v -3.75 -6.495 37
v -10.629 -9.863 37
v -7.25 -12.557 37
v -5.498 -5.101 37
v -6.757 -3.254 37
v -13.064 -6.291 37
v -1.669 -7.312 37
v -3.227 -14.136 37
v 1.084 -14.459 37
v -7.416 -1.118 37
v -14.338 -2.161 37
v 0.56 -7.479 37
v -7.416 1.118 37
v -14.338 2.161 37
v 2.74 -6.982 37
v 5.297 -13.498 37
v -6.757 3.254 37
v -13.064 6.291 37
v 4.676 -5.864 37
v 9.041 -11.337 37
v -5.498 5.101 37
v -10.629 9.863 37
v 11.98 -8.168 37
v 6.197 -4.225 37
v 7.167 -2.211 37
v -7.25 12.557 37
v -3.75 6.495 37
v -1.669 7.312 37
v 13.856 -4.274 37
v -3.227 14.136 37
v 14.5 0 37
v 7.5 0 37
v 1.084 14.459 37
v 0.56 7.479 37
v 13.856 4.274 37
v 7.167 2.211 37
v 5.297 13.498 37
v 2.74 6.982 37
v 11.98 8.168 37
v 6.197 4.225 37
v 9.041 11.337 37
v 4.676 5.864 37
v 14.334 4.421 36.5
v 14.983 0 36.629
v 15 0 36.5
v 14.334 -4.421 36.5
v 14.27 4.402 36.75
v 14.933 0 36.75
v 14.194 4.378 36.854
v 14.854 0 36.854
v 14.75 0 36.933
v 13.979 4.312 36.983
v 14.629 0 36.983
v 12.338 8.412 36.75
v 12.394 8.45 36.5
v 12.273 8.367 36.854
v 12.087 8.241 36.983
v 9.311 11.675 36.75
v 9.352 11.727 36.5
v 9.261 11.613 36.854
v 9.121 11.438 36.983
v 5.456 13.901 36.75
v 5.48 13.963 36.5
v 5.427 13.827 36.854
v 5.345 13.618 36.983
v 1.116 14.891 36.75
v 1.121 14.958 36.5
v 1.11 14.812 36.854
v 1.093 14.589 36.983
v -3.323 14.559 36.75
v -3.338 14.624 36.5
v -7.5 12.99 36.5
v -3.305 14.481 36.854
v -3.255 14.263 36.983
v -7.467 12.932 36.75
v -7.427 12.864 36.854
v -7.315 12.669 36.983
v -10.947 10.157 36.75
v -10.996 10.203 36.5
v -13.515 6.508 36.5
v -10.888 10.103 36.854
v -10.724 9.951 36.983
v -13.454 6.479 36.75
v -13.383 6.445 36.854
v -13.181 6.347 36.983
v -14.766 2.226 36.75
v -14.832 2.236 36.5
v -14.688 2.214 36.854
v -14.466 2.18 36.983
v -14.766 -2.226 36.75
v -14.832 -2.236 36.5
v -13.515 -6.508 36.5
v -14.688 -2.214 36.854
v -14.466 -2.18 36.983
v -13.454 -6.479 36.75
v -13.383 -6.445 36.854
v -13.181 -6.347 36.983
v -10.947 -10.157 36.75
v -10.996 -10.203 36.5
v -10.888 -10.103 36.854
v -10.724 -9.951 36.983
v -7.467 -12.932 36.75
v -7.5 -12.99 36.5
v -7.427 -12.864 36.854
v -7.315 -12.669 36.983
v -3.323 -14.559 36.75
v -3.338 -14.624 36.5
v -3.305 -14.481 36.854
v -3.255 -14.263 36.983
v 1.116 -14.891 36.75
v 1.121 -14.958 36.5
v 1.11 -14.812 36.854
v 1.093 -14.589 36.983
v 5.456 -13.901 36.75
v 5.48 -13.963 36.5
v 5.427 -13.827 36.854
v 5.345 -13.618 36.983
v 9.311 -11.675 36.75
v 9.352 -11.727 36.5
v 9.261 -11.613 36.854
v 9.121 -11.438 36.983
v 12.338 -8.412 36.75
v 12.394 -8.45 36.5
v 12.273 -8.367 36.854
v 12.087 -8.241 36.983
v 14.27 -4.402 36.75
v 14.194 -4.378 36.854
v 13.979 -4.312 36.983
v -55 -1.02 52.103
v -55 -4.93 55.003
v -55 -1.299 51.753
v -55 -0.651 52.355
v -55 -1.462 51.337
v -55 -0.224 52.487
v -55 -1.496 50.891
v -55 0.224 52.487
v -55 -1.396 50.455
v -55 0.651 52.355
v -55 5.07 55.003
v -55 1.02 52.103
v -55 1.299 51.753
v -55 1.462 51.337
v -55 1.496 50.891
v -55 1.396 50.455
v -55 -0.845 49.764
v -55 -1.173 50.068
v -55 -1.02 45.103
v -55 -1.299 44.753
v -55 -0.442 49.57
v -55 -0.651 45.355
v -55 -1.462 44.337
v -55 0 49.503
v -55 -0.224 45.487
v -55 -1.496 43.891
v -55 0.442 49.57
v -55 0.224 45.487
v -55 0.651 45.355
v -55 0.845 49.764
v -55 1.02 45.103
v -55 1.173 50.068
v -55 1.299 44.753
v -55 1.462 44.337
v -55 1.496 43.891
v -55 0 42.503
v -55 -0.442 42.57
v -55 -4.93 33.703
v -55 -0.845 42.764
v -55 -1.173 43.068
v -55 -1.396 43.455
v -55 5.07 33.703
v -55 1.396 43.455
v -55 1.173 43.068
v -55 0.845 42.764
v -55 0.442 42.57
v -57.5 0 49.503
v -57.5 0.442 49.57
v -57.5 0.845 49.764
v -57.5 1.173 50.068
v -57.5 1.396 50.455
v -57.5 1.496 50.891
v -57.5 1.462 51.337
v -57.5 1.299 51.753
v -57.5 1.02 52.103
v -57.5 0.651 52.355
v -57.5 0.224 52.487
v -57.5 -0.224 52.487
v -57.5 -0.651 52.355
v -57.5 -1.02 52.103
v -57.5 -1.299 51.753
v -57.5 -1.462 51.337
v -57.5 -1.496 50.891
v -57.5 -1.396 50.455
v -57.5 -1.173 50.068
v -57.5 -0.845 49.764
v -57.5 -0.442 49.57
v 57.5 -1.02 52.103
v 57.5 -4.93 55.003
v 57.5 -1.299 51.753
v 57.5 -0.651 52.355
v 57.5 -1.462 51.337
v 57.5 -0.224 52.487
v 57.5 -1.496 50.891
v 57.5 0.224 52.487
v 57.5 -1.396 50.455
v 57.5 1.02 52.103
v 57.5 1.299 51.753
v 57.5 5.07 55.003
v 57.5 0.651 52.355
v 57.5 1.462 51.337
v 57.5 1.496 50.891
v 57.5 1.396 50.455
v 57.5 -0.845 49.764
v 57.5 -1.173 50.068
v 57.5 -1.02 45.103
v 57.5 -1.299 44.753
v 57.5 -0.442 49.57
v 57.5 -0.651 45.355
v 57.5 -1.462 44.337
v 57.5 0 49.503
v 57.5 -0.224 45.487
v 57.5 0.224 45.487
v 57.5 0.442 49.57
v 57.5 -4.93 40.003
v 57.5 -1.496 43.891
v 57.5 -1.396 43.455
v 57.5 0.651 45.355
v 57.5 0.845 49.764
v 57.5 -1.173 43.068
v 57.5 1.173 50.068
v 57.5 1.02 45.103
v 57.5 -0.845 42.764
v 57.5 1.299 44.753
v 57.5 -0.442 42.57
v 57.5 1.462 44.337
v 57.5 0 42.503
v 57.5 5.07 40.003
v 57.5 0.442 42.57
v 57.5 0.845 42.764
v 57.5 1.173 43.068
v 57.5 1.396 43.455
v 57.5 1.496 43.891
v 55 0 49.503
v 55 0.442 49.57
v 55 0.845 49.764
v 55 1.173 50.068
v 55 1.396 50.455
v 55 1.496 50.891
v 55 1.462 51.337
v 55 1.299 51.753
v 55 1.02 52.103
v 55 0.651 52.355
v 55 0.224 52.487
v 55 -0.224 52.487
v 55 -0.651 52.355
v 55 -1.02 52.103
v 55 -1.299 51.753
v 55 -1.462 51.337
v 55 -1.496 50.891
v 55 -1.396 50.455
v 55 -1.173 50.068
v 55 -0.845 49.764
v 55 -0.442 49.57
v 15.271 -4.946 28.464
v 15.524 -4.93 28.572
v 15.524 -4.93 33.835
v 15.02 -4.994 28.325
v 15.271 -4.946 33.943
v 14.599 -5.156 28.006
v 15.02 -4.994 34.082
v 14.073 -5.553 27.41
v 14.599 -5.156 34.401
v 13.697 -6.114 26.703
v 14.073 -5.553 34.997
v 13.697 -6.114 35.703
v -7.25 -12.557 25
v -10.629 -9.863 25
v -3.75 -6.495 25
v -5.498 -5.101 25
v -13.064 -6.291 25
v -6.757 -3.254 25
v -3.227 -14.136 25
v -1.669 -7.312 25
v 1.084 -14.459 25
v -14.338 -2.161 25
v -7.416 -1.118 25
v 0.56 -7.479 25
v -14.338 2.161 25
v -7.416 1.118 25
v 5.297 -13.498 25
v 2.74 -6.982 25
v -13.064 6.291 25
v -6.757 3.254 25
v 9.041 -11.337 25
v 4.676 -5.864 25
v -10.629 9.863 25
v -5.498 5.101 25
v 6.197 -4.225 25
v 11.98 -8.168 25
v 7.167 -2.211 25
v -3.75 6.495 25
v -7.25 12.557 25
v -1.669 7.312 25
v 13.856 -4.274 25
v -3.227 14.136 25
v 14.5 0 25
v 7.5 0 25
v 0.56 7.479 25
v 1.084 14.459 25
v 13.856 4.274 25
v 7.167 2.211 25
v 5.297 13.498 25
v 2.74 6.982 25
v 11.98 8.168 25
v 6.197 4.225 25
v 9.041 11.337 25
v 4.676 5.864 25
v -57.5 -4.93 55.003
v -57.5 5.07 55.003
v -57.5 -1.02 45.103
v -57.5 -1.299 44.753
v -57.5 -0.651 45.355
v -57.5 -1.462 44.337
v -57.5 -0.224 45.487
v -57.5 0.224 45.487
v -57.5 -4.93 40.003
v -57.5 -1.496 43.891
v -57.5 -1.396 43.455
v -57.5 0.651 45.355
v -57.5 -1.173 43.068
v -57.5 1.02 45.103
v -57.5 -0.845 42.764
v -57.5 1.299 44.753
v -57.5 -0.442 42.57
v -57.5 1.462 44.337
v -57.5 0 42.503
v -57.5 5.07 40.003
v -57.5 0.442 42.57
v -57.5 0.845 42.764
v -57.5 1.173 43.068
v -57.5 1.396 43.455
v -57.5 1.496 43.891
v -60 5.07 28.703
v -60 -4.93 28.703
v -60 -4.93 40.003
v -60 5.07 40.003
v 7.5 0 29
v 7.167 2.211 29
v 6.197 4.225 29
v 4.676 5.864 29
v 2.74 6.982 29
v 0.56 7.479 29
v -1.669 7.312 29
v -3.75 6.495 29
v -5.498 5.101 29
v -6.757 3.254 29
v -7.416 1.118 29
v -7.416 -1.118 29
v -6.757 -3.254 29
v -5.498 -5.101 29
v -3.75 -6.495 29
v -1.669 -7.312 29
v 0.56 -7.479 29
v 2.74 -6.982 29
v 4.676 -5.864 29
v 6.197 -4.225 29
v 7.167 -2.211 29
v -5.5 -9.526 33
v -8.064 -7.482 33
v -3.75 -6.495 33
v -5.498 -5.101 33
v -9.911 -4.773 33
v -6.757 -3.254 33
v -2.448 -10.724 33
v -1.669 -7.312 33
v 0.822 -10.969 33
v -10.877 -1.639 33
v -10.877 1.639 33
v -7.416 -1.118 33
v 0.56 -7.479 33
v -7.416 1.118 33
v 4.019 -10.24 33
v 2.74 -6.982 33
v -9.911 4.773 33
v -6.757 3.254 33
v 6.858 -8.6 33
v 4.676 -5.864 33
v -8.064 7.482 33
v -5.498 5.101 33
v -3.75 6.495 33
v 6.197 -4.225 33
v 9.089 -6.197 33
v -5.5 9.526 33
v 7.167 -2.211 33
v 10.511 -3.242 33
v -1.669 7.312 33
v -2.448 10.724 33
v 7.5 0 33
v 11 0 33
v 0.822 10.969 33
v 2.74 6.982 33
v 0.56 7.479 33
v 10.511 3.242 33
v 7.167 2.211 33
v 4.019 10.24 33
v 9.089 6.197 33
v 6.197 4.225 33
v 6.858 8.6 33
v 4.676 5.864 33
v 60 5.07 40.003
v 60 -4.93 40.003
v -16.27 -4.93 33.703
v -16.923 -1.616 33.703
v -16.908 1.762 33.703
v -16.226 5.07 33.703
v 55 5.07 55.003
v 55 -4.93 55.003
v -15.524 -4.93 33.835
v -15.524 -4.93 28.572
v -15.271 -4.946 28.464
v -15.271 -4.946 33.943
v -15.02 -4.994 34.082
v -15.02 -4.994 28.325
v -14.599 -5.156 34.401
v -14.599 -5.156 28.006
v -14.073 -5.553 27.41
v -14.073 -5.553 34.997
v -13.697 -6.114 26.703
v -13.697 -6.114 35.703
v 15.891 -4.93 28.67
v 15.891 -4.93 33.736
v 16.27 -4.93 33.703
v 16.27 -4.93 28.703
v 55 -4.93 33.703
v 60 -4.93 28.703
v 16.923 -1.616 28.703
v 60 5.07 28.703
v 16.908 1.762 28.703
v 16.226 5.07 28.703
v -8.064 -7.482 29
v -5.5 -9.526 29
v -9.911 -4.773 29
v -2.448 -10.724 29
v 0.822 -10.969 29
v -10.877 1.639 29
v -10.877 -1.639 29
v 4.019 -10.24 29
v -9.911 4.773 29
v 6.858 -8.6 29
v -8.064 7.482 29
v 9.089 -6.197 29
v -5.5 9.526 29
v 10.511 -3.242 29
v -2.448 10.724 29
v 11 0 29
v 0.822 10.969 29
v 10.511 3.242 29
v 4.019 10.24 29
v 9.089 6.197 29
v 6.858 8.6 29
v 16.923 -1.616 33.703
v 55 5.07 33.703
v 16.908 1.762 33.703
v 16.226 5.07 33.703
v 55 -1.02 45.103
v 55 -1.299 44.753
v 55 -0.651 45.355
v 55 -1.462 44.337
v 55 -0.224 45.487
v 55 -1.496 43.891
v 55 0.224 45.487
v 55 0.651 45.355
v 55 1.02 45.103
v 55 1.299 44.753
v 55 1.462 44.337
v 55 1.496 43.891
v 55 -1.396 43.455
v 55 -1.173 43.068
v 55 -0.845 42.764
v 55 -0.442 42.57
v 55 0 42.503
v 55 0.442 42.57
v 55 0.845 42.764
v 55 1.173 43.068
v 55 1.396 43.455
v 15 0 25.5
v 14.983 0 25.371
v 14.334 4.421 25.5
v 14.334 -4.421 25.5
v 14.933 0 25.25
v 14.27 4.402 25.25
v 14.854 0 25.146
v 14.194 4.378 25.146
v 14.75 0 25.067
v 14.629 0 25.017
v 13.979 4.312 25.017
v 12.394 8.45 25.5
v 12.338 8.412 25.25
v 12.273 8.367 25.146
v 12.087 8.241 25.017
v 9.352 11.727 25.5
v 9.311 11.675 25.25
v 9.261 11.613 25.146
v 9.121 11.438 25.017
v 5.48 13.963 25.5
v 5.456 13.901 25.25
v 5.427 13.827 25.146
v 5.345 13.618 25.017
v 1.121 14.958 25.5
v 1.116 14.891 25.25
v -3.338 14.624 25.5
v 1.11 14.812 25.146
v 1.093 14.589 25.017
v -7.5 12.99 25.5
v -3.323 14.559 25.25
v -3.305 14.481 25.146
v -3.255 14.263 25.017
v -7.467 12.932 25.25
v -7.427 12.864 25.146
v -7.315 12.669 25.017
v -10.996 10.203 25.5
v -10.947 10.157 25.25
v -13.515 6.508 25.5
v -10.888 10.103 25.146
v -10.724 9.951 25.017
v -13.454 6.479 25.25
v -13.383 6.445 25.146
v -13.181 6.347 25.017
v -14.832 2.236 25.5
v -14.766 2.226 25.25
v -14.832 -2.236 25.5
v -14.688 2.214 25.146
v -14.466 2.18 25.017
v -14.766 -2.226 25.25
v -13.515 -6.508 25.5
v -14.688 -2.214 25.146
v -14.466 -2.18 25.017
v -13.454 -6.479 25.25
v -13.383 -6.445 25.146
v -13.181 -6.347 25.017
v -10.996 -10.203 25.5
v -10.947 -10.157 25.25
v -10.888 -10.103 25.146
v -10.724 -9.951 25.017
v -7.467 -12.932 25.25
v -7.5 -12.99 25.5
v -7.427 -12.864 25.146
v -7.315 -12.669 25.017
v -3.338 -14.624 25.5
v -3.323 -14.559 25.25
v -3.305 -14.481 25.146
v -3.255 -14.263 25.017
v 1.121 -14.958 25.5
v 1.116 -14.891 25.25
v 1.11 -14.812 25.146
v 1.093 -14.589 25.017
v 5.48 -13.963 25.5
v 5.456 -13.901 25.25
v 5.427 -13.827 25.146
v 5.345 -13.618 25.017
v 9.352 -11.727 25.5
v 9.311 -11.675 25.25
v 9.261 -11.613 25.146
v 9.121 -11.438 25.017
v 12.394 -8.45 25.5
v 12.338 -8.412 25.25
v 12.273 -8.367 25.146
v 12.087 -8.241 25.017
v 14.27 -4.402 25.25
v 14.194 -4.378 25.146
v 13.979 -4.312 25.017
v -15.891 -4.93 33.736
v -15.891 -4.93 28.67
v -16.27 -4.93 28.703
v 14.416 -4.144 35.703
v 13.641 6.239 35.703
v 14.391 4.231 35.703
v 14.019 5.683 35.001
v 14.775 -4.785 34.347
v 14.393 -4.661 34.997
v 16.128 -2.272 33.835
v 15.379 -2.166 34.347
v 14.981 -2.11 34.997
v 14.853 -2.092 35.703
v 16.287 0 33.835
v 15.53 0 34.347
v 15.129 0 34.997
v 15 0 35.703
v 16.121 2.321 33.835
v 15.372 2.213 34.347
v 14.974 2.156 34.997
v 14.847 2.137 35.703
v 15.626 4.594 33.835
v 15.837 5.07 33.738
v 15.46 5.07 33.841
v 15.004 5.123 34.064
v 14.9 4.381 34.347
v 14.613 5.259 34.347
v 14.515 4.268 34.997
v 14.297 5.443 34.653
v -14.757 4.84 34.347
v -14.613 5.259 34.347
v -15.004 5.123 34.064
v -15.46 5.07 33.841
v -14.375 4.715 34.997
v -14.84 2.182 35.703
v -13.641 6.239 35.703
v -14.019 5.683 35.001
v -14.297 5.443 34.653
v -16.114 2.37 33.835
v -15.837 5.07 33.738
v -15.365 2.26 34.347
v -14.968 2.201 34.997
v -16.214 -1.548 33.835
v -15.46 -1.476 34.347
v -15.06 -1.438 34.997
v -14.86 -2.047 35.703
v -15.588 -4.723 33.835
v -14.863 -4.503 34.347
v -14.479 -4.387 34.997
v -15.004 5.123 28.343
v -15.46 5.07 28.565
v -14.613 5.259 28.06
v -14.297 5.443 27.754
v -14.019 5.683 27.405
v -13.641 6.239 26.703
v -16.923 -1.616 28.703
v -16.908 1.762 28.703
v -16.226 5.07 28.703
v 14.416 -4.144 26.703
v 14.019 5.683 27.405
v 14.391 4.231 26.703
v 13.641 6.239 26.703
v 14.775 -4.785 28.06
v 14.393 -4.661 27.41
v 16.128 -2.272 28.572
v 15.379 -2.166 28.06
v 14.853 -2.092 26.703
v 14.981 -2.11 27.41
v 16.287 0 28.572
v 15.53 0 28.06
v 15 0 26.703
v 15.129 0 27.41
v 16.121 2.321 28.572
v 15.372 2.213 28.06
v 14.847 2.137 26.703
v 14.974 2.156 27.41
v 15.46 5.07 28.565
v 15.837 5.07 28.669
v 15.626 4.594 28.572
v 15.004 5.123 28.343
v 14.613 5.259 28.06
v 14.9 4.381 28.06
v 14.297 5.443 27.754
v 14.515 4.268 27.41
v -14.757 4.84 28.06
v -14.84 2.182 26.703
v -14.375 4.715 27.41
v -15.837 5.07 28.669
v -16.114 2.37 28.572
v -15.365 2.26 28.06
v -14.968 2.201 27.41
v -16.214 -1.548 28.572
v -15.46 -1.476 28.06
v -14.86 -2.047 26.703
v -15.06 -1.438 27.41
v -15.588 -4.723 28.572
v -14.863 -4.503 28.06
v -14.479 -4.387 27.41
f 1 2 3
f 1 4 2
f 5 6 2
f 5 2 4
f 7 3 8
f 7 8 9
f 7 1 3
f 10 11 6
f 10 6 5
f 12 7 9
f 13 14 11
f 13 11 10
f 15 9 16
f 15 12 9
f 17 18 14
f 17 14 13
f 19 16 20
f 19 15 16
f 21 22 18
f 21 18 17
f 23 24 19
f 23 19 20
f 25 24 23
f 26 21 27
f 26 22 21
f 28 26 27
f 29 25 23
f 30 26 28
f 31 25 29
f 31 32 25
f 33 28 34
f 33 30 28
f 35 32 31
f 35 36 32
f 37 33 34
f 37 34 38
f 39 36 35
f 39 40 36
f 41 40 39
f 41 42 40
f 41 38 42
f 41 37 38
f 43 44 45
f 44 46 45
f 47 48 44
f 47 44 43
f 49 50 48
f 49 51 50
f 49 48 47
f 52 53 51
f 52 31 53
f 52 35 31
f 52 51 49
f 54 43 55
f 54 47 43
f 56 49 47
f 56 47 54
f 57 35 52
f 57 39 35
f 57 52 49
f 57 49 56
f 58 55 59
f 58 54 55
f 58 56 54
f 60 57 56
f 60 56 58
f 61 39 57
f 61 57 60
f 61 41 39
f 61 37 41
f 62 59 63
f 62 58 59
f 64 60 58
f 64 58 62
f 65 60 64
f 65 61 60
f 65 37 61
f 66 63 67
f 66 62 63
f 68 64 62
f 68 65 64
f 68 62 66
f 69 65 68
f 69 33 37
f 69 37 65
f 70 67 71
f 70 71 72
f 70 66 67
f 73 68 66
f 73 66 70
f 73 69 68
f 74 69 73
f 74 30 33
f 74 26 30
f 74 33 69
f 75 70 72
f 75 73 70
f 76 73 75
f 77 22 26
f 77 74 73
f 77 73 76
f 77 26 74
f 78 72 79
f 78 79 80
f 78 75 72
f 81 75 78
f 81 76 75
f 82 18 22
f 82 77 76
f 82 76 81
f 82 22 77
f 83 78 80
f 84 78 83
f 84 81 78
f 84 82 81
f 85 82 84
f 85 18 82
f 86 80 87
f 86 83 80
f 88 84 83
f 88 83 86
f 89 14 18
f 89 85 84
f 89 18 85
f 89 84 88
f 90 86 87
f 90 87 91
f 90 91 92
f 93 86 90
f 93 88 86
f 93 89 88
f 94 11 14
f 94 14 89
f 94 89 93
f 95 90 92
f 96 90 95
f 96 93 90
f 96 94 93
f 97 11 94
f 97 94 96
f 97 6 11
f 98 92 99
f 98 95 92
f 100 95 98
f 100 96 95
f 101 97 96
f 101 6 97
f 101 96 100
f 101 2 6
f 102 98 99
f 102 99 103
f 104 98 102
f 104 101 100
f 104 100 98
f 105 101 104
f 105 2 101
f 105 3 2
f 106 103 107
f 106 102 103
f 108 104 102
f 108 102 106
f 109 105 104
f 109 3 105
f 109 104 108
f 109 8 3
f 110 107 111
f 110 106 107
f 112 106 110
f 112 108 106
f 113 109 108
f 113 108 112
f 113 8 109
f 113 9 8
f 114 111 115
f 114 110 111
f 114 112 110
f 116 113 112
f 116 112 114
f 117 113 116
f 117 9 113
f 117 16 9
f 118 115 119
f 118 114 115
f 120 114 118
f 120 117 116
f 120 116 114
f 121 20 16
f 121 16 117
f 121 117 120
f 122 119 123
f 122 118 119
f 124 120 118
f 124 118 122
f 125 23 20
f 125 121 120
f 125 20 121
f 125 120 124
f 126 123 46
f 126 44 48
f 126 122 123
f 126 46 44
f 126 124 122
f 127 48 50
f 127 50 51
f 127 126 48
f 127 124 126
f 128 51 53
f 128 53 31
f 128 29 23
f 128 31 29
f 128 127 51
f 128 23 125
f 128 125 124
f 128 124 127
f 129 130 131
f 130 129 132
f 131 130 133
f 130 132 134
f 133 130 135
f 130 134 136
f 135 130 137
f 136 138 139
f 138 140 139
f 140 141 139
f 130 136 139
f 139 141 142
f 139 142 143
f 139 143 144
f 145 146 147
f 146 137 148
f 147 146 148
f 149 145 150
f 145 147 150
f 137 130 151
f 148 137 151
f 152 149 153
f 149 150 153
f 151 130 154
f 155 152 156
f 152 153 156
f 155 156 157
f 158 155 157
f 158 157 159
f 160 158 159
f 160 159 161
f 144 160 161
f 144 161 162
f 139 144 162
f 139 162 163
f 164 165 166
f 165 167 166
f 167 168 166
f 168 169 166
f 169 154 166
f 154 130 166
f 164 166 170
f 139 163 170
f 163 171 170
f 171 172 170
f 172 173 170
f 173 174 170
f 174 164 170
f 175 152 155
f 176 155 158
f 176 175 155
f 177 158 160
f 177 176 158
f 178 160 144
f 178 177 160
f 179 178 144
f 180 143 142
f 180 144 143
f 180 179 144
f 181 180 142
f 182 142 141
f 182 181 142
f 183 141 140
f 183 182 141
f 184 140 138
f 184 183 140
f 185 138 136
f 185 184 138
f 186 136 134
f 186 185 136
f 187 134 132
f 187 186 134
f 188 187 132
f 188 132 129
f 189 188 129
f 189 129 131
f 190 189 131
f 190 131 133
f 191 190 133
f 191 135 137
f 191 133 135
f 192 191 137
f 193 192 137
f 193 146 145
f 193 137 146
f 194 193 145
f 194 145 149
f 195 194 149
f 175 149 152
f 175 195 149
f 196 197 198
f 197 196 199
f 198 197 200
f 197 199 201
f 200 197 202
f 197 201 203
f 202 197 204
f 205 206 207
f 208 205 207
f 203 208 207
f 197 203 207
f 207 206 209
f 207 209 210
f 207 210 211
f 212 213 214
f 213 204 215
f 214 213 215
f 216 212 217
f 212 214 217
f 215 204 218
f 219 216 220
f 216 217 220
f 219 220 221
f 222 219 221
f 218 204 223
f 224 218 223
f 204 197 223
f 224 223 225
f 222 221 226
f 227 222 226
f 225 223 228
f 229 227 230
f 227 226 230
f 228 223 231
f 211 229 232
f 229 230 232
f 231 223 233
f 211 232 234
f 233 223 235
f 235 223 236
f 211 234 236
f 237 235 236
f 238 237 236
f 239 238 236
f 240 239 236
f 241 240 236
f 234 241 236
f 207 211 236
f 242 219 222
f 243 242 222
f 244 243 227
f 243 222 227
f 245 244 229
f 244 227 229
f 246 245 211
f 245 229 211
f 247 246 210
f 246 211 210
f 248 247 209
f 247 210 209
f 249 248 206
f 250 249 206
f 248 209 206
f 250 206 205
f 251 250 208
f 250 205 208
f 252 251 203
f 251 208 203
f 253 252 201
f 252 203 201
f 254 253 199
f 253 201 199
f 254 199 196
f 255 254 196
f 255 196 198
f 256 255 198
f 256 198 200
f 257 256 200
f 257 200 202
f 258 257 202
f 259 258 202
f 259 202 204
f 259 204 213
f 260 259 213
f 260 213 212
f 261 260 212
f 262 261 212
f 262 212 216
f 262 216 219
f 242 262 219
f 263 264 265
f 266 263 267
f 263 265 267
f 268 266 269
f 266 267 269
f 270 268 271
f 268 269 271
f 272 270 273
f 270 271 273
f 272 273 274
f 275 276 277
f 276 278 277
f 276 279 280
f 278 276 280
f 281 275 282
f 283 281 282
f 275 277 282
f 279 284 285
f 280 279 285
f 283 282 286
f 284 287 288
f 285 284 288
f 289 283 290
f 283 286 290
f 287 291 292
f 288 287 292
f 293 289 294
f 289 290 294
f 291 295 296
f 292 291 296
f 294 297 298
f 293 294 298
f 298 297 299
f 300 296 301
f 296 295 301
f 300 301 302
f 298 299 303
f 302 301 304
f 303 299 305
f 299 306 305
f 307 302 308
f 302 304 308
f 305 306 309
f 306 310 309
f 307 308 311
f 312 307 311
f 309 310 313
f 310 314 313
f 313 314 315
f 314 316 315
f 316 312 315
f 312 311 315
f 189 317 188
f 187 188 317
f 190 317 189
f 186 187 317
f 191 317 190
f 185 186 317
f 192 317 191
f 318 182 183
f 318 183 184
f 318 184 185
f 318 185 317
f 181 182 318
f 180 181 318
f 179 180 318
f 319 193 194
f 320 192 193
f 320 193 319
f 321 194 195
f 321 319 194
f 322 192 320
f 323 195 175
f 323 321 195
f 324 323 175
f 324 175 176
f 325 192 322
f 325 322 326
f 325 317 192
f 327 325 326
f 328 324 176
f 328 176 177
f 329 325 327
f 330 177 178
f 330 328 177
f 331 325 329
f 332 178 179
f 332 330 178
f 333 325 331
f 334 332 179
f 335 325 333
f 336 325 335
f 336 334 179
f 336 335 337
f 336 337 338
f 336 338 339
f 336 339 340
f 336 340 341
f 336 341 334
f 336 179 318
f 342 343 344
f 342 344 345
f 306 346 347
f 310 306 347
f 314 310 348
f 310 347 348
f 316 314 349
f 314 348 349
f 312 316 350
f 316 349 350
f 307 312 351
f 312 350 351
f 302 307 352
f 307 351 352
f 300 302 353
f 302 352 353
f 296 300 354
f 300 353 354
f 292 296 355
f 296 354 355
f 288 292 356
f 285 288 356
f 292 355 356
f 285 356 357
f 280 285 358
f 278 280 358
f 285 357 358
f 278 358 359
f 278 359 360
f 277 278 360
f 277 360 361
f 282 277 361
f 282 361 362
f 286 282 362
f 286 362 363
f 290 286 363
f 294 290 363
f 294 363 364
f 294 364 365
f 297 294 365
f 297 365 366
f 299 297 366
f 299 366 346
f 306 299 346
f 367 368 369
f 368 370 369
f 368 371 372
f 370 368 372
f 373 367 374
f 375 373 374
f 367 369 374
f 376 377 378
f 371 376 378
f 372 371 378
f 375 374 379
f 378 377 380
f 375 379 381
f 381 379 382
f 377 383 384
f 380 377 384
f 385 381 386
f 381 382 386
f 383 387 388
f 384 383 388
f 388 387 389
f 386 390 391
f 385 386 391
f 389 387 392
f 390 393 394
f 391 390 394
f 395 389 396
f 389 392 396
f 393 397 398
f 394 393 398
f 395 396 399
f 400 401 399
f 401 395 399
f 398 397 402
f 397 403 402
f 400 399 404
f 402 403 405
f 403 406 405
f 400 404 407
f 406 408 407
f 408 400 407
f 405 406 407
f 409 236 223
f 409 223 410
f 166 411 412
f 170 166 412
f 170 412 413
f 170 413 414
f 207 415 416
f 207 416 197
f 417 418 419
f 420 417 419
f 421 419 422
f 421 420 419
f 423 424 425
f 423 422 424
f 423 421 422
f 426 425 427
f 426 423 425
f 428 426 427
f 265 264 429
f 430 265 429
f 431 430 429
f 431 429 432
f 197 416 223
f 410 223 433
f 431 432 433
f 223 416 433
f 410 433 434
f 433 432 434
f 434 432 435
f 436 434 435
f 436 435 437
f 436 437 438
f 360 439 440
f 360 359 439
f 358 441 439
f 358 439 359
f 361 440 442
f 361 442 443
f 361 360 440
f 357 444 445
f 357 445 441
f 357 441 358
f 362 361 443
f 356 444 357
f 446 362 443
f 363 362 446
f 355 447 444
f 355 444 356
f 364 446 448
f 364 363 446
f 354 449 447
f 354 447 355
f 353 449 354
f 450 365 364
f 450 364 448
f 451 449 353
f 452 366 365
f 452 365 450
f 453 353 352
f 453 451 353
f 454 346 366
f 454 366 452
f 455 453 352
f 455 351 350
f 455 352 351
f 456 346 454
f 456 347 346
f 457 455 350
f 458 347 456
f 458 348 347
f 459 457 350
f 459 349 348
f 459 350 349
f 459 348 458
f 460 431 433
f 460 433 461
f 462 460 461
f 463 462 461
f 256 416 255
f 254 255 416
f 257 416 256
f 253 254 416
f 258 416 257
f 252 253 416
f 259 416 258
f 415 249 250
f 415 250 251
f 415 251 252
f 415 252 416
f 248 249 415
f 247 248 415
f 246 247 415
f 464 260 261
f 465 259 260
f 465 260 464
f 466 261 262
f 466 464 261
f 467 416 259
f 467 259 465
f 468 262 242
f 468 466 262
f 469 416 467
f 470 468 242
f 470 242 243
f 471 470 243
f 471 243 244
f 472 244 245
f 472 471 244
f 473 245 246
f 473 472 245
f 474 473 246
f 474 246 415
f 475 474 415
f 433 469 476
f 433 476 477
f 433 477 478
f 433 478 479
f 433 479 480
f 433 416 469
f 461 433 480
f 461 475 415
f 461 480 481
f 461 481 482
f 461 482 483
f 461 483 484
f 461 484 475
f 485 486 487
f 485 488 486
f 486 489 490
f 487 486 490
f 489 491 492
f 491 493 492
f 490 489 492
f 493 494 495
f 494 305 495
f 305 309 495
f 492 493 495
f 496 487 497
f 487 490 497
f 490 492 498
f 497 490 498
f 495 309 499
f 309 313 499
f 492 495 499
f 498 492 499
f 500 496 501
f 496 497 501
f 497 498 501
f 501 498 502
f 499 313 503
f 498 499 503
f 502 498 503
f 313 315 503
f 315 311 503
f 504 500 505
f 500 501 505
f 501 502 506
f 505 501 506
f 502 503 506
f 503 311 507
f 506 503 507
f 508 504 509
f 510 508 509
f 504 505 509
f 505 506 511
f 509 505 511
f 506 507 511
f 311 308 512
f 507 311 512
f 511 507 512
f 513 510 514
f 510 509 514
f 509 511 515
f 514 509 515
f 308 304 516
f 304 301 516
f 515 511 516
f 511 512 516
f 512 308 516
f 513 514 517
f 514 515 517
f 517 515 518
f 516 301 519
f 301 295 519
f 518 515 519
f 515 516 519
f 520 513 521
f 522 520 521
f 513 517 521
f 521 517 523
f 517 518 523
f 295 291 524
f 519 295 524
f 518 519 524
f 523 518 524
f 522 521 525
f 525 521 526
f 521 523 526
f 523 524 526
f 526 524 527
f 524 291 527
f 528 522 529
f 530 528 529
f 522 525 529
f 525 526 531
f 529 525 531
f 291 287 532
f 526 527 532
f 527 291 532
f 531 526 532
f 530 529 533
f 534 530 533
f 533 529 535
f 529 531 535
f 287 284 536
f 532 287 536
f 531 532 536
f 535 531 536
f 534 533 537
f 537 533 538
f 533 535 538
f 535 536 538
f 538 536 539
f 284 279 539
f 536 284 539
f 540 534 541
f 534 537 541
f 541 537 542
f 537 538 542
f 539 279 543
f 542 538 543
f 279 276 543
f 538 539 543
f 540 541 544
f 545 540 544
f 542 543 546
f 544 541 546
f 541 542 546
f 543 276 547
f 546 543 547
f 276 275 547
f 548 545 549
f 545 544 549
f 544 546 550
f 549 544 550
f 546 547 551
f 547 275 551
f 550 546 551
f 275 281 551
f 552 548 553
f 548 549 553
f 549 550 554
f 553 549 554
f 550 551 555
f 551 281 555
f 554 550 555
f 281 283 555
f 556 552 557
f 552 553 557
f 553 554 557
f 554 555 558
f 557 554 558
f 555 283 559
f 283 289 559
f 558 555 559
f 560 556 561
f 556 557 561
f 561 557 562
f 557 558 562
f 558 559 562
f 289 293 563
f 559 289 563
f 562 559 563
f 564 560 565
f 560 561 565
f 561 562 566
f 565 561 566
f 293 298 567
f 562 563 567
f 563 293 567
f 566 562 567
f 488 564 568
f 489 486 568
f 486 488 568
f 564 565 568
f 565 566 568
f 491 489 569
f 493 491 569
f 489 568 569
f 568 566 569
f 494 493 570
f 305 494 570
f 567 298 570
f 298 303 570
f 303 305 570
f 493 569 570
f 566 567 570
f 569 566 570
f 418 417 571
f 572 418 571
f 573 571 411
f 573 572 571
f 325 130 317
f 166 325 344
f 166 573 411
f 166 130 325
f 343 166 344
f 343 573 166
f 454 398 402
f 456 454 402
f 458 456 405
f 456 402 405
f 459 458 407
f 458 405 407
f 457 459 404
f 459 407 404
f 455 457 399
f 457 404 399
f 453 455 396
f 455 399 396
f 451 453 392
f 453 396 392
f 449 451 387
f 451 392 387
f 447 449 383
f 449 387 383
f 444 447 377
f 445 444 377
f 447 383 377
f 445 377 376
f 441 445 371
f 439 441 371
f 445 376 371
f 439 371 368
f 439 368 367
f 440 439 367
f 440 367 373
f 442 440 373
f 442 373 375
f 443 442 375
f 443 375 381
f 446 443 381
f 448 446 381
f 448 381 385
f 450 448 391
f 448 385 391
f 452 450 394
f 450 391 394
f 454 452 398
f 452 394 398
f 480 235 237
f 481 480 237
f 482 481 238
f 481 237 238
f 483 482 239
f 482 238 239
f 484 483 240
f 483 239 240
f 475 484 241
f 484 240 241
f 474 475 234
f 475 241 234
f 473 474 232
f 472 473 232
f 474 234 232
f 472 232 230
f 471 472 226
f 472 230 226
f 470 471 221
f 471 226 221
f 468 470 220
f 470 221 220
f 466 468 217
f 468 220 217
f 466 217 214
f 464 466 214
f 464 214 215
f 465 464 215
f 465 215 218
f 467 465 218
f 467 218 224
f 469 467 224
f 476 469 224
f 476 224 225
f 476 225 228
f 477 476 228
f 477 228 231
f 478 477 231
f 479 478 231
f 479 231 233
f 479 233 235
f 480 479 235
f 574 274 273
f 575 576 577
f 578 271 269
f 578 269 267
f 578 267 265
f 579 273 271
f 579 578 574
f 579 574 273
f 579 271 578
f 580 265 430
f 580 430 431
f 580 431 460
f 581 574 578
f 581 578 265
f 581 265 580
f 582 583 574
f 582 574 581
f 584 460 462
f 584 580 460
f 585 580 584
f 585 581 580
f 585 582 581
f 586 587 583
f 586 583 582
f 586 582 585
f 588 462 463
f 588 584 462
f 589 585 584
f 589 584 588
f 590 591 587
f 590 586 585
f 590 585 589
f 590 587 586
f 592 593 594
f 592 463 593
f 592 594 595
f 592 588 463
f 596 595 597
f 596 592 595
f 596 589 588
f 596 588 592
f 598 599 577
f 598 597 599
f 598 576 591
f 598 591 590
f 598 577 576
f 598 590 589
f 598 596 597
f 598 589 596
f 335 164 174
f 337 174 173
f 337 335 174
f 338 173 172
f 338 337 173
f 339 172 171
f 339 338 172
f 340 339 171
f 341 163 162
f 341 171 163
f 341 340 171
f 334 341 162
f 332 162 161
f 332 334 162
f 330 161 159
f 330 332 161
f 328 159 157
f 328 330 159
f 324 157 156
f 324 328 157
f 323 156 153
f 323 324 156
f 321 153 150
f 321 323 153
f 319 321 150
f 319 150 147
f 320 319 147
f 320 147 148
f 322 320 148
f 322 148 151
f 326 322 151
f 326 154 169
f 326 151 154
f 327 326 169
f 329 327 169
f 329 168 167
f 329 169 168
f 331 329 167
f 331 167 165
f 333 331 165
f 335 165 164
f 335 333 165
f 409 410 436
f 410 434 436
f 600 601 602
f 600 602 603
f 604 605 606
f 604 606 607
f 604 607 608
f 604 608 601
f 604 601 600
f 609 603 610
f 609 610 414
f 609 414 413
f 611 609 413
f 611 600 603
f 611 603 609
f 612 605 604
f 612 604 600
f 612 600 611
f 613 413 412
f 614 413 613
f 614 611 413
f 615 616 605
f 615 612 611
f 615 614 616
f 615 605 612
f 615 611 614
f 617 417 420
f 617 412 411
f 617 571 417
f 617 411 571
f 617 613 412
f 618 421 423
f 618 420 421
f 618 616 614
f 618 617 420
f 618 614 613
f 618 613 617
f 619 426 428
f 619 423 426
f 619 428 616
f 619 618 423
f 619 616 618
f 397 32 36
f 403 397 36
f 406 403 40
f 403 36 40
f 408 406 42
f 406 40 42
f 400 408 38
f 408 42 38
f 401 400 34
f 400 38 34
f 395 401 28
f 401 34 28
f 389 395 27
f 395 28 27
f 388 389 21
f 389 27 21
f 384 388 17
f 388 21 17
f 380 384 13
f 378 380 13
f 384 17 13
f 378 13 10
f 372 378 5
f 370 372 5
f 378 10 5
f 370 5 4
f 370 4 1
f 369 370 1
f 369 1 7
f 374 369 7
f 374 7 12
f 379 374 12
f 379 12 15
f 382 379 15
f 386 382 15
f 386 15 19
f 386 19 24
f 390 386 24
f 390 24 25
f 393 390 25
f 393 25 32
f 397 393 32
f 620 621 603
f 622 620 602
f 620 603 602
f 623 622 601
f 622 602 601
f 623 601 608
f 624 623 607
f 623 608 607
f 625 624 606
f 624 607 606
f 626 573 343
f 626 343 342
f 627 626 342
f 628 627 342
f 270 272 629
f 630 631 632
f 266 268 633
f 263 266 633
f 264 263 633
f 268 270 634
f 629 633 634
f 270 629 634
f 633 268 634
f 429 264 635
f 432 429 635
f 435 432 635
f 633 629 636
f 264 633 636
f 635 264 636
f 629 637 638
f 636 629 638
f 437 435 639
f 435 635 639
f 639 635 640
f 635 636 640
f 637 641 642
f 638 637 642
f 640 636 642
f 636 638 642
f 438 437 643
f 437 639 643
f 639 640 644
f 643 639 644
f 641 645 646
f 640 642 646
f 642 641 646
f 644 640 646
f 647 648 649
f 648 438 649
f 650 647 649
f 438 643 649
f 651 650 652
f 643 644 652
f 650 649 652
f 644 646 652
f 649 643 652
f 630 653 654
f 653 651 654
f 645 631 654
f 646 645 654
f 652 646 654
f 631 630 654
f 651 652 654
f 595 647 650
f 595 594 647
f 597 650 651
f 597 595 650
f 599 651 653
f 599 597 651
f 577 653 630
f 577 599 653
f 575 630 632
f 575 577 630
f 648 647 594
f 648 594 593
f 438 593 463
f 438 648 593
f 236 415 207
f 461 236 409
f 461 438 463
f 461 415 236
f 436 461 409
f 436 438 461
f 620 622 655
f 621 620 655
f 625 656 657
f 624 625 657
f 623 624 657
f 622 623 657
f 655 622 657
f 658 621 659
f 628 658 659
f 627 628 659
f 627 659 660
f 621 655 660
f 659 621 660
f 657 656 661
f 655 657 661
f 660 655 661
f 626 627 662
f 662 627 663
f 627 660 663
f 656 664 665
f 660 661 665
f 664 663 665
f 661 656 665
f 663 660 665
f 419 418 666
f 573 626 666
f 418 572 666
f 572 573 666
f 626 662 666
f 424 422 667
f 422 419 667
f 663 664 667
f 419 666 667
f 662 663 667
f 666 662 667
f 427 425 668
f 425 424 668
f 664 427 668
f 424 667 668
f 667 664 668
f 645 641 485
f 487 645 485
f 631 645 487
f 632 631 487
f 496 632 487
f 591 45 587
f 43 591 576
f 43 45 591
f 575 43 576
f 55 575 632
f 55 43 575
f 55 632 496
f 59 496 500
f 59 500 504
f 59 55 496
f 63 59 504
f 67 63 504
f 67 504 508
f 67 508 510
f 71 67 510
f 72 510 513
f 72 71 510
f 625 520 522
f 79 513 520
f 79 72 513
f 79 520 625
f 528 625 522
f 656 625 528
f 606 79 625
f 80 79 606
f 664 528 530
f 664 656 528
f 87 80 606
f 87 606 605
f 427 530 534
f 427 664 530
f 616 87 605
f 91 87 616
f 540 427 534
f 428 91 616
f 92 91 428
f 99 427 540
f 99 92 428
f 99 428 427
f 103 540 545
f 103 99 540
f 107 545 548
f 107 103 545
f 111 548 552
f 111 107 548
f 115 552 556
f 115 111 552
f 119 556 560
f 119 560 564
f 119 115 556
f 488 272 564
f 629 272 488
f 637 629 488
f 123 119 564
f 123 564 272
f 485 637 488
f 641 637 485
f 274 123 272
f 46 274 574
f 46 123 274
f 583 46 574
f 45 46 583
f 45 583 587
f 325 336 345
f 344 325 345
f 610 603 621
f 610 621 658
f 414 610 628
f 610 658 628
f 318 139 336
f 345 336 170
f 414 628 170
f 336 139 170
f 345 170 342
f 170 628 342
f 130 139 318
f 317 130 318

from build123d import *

# Parameters (mm, degrees)
SKETCH7_R            = 15
BOSS_EXTRUDE2_DEPTH  = 12
SKETCH9_R            = 11
CUT_EXTRUDE1_DEPTH   = 4
SKETCH8_R            = 7.5
CUT_EXTRUDE2_DEPTH   = 20
BOSS_EXTRUDE4_START  = -3
SKETCH11_W           = 5
SKETCH11_H           = 10
BOSS_EXTRUDE4_DEPTH  = 48
SKETCH14_W           = 5
SKETCH14_H           = 10
BOSS_EXTRUDE5_DEPTH  = 6.3
SKETCH17_W           = 2.5
SKETCH17_H           = 10
BOSS_EXTRUDE8_DEPTH  = 15
SKETCH20_R           = 1.5
CUT_EXTRUDE3_DEPTH   = 15
FILLET2_R            = 2
FILLET7_R            = 0.5
FILLET8_R            = 0.5
FILLET2_OF_MIRROR5_R = 2


with BuildPart() as part:
    # Sketch7 → Boss-Extrude2 (new body)
    with BuildSketch(Plane.XY.offset(37)):
        Circle(SKETCH7_R)
    extrude(amount=-BOSS_EXTRUDE2_DEPTH)

    # Sketch9 → Cut-Extrude1 (cut)
    with BuildSketch(Plane.XY.offset(33)):
        Circle(SKETCH9_R)
    extrude(amount=-CUT_EXTRUDE1_DEPTH, mode=Mode.SUBTRACT)

    # Sketch8 → Cut-Extrude2 (cut)
    with BuildSketch(Plane.XY.offset(37)):
        Circle(SKETCH8_R)
    extrude(amount=-CUT_EXTRUDE2_DEPTH, mode=Mode.SUBTRACT)

    # Sketch11 → Boss-Extrude4 (add)
    with BuildSketch(Plane(origin=(15, 0, 0), x_dir=(0, 0, -1), z_dir=(1, 0, 0)).offset(BOSS_EXTRUDE4_START)):
        with Locations((-31.203319291, 0.070417763)):
            Rectangle(SKETCH11_W, SKETCH11_H)
    boss_extrude4 = extrude(amount=BOSS_EXTRUDE4_DEPTH)

    # Sketch14 → Boss-Extrude5 (add)
    with BuildSketch(Plane.XY.offset(33.703319291)):
        with Locations((57.5, 0.070417763)):
            Rectangle(SKETCH14_W, SKETCH14_H)
    boss_extrude5 = extrude(amount=BOSS_EXTRUDE5_DEPTH)

    # Sketch17 → Boss-Extrude8 (add)
    with BuildSketch(Plane.XY.offset(40.003319291)):
        with Locations((56.25, 0.070417763)):
            Rectangle(SKETCH17_W, SKETCH17_H)
    boss_extrude8 = extrude(amount=BOSS_EXTRUDE8_DEPTH)

    # Sketch20 → Cut-Extrude3 (cut)
    with BuildSketch(Plane(origin=(57.5, 0, 0), x_dir=(0, 0, -1), z_dir=(1, 0, 0))):
        with Locations((-44.003319291, 0)):
            Circle(SKETCH20_R)
        with Locations((-51.003319291, 0)):
            Circle(SKETCH20_R)
    cut_extrude3 = extrude(amount=-CUT_EXTRUDE3_DEPTH, mode=Mode.SUBTRACT)

    # Fillet2
    fillet2_edges = [part.edges().sort_by_distance(p)[0] for p in [
        (14.166835178, -4.929582237, 31.203319291),
        (14.777611852, 2.573361217, 28.703319291),
        (14.117041606, 5.070417763, 31.203319291),
        (14.777611852, 2.573361217, 33.703319291),
    ]]
    fillet(fillet2_edges, radius=FILLET2_R)

    # Fillet7
    fillet7_edges = [part.edges().sort_by_distance(p)[0] for p in [
        (-15, 0, 37),
    ]]
    fillet(fillet7_edges, radius=FILLET7_R)

    # Fillet8
    fillet8_edges = [part.edges().sort_by_distance(p)[0] for p in [
        (-15, 0, 25),
    ]]
    fillet(fillet8_edges, radius=FILLET8_R)

    # Mirror5: Boss-Extrude4, Boss-Extrude5, Boss-Extrude8, Cut-Extrude3 across plane
    add(boss_extrude4.mirror(Plane(origin=(0, 0, 0), x_dir=(0, 0, 1), z_dir=(1, 0, 0))))
    add(boss_extrude5.mirror(Plane(origin=(0, 0, 0), x_dir=(0, 0, 1), z_dir=(1, 0, 0))))
    add(boss_extrude8.mirror(Plane(origin=(0, 0, 0), x_dir=(0, 0, 1), z_dir=(1, 0, 0))))
    add(cut_extrude3.mirror(Plane(origin=(0, 0, 0), x_dir=(0, 0, 1), z_dir=(1, 0, 0))), mode=Mode.SUBTRACT)

    # Fillet2 of Mirror5
    fillet2_of_mirror5_edges = [part.edges().sort_by_distance(p)[0] for p in [
        (-14.166835178, -4.929582237, 31.203319291),
        (-14.777611852, 2.573361217, 28.703319291),
        (-14.117041606, 5.070417763, 31.203319291),
        (-14.777611852, 2.573361217, 33.703319291),
    ]]
    fillet(fillet2_of_mirror5_edges, radius=FILLET2_OF_MIRROR5_R)


solid = part.part
